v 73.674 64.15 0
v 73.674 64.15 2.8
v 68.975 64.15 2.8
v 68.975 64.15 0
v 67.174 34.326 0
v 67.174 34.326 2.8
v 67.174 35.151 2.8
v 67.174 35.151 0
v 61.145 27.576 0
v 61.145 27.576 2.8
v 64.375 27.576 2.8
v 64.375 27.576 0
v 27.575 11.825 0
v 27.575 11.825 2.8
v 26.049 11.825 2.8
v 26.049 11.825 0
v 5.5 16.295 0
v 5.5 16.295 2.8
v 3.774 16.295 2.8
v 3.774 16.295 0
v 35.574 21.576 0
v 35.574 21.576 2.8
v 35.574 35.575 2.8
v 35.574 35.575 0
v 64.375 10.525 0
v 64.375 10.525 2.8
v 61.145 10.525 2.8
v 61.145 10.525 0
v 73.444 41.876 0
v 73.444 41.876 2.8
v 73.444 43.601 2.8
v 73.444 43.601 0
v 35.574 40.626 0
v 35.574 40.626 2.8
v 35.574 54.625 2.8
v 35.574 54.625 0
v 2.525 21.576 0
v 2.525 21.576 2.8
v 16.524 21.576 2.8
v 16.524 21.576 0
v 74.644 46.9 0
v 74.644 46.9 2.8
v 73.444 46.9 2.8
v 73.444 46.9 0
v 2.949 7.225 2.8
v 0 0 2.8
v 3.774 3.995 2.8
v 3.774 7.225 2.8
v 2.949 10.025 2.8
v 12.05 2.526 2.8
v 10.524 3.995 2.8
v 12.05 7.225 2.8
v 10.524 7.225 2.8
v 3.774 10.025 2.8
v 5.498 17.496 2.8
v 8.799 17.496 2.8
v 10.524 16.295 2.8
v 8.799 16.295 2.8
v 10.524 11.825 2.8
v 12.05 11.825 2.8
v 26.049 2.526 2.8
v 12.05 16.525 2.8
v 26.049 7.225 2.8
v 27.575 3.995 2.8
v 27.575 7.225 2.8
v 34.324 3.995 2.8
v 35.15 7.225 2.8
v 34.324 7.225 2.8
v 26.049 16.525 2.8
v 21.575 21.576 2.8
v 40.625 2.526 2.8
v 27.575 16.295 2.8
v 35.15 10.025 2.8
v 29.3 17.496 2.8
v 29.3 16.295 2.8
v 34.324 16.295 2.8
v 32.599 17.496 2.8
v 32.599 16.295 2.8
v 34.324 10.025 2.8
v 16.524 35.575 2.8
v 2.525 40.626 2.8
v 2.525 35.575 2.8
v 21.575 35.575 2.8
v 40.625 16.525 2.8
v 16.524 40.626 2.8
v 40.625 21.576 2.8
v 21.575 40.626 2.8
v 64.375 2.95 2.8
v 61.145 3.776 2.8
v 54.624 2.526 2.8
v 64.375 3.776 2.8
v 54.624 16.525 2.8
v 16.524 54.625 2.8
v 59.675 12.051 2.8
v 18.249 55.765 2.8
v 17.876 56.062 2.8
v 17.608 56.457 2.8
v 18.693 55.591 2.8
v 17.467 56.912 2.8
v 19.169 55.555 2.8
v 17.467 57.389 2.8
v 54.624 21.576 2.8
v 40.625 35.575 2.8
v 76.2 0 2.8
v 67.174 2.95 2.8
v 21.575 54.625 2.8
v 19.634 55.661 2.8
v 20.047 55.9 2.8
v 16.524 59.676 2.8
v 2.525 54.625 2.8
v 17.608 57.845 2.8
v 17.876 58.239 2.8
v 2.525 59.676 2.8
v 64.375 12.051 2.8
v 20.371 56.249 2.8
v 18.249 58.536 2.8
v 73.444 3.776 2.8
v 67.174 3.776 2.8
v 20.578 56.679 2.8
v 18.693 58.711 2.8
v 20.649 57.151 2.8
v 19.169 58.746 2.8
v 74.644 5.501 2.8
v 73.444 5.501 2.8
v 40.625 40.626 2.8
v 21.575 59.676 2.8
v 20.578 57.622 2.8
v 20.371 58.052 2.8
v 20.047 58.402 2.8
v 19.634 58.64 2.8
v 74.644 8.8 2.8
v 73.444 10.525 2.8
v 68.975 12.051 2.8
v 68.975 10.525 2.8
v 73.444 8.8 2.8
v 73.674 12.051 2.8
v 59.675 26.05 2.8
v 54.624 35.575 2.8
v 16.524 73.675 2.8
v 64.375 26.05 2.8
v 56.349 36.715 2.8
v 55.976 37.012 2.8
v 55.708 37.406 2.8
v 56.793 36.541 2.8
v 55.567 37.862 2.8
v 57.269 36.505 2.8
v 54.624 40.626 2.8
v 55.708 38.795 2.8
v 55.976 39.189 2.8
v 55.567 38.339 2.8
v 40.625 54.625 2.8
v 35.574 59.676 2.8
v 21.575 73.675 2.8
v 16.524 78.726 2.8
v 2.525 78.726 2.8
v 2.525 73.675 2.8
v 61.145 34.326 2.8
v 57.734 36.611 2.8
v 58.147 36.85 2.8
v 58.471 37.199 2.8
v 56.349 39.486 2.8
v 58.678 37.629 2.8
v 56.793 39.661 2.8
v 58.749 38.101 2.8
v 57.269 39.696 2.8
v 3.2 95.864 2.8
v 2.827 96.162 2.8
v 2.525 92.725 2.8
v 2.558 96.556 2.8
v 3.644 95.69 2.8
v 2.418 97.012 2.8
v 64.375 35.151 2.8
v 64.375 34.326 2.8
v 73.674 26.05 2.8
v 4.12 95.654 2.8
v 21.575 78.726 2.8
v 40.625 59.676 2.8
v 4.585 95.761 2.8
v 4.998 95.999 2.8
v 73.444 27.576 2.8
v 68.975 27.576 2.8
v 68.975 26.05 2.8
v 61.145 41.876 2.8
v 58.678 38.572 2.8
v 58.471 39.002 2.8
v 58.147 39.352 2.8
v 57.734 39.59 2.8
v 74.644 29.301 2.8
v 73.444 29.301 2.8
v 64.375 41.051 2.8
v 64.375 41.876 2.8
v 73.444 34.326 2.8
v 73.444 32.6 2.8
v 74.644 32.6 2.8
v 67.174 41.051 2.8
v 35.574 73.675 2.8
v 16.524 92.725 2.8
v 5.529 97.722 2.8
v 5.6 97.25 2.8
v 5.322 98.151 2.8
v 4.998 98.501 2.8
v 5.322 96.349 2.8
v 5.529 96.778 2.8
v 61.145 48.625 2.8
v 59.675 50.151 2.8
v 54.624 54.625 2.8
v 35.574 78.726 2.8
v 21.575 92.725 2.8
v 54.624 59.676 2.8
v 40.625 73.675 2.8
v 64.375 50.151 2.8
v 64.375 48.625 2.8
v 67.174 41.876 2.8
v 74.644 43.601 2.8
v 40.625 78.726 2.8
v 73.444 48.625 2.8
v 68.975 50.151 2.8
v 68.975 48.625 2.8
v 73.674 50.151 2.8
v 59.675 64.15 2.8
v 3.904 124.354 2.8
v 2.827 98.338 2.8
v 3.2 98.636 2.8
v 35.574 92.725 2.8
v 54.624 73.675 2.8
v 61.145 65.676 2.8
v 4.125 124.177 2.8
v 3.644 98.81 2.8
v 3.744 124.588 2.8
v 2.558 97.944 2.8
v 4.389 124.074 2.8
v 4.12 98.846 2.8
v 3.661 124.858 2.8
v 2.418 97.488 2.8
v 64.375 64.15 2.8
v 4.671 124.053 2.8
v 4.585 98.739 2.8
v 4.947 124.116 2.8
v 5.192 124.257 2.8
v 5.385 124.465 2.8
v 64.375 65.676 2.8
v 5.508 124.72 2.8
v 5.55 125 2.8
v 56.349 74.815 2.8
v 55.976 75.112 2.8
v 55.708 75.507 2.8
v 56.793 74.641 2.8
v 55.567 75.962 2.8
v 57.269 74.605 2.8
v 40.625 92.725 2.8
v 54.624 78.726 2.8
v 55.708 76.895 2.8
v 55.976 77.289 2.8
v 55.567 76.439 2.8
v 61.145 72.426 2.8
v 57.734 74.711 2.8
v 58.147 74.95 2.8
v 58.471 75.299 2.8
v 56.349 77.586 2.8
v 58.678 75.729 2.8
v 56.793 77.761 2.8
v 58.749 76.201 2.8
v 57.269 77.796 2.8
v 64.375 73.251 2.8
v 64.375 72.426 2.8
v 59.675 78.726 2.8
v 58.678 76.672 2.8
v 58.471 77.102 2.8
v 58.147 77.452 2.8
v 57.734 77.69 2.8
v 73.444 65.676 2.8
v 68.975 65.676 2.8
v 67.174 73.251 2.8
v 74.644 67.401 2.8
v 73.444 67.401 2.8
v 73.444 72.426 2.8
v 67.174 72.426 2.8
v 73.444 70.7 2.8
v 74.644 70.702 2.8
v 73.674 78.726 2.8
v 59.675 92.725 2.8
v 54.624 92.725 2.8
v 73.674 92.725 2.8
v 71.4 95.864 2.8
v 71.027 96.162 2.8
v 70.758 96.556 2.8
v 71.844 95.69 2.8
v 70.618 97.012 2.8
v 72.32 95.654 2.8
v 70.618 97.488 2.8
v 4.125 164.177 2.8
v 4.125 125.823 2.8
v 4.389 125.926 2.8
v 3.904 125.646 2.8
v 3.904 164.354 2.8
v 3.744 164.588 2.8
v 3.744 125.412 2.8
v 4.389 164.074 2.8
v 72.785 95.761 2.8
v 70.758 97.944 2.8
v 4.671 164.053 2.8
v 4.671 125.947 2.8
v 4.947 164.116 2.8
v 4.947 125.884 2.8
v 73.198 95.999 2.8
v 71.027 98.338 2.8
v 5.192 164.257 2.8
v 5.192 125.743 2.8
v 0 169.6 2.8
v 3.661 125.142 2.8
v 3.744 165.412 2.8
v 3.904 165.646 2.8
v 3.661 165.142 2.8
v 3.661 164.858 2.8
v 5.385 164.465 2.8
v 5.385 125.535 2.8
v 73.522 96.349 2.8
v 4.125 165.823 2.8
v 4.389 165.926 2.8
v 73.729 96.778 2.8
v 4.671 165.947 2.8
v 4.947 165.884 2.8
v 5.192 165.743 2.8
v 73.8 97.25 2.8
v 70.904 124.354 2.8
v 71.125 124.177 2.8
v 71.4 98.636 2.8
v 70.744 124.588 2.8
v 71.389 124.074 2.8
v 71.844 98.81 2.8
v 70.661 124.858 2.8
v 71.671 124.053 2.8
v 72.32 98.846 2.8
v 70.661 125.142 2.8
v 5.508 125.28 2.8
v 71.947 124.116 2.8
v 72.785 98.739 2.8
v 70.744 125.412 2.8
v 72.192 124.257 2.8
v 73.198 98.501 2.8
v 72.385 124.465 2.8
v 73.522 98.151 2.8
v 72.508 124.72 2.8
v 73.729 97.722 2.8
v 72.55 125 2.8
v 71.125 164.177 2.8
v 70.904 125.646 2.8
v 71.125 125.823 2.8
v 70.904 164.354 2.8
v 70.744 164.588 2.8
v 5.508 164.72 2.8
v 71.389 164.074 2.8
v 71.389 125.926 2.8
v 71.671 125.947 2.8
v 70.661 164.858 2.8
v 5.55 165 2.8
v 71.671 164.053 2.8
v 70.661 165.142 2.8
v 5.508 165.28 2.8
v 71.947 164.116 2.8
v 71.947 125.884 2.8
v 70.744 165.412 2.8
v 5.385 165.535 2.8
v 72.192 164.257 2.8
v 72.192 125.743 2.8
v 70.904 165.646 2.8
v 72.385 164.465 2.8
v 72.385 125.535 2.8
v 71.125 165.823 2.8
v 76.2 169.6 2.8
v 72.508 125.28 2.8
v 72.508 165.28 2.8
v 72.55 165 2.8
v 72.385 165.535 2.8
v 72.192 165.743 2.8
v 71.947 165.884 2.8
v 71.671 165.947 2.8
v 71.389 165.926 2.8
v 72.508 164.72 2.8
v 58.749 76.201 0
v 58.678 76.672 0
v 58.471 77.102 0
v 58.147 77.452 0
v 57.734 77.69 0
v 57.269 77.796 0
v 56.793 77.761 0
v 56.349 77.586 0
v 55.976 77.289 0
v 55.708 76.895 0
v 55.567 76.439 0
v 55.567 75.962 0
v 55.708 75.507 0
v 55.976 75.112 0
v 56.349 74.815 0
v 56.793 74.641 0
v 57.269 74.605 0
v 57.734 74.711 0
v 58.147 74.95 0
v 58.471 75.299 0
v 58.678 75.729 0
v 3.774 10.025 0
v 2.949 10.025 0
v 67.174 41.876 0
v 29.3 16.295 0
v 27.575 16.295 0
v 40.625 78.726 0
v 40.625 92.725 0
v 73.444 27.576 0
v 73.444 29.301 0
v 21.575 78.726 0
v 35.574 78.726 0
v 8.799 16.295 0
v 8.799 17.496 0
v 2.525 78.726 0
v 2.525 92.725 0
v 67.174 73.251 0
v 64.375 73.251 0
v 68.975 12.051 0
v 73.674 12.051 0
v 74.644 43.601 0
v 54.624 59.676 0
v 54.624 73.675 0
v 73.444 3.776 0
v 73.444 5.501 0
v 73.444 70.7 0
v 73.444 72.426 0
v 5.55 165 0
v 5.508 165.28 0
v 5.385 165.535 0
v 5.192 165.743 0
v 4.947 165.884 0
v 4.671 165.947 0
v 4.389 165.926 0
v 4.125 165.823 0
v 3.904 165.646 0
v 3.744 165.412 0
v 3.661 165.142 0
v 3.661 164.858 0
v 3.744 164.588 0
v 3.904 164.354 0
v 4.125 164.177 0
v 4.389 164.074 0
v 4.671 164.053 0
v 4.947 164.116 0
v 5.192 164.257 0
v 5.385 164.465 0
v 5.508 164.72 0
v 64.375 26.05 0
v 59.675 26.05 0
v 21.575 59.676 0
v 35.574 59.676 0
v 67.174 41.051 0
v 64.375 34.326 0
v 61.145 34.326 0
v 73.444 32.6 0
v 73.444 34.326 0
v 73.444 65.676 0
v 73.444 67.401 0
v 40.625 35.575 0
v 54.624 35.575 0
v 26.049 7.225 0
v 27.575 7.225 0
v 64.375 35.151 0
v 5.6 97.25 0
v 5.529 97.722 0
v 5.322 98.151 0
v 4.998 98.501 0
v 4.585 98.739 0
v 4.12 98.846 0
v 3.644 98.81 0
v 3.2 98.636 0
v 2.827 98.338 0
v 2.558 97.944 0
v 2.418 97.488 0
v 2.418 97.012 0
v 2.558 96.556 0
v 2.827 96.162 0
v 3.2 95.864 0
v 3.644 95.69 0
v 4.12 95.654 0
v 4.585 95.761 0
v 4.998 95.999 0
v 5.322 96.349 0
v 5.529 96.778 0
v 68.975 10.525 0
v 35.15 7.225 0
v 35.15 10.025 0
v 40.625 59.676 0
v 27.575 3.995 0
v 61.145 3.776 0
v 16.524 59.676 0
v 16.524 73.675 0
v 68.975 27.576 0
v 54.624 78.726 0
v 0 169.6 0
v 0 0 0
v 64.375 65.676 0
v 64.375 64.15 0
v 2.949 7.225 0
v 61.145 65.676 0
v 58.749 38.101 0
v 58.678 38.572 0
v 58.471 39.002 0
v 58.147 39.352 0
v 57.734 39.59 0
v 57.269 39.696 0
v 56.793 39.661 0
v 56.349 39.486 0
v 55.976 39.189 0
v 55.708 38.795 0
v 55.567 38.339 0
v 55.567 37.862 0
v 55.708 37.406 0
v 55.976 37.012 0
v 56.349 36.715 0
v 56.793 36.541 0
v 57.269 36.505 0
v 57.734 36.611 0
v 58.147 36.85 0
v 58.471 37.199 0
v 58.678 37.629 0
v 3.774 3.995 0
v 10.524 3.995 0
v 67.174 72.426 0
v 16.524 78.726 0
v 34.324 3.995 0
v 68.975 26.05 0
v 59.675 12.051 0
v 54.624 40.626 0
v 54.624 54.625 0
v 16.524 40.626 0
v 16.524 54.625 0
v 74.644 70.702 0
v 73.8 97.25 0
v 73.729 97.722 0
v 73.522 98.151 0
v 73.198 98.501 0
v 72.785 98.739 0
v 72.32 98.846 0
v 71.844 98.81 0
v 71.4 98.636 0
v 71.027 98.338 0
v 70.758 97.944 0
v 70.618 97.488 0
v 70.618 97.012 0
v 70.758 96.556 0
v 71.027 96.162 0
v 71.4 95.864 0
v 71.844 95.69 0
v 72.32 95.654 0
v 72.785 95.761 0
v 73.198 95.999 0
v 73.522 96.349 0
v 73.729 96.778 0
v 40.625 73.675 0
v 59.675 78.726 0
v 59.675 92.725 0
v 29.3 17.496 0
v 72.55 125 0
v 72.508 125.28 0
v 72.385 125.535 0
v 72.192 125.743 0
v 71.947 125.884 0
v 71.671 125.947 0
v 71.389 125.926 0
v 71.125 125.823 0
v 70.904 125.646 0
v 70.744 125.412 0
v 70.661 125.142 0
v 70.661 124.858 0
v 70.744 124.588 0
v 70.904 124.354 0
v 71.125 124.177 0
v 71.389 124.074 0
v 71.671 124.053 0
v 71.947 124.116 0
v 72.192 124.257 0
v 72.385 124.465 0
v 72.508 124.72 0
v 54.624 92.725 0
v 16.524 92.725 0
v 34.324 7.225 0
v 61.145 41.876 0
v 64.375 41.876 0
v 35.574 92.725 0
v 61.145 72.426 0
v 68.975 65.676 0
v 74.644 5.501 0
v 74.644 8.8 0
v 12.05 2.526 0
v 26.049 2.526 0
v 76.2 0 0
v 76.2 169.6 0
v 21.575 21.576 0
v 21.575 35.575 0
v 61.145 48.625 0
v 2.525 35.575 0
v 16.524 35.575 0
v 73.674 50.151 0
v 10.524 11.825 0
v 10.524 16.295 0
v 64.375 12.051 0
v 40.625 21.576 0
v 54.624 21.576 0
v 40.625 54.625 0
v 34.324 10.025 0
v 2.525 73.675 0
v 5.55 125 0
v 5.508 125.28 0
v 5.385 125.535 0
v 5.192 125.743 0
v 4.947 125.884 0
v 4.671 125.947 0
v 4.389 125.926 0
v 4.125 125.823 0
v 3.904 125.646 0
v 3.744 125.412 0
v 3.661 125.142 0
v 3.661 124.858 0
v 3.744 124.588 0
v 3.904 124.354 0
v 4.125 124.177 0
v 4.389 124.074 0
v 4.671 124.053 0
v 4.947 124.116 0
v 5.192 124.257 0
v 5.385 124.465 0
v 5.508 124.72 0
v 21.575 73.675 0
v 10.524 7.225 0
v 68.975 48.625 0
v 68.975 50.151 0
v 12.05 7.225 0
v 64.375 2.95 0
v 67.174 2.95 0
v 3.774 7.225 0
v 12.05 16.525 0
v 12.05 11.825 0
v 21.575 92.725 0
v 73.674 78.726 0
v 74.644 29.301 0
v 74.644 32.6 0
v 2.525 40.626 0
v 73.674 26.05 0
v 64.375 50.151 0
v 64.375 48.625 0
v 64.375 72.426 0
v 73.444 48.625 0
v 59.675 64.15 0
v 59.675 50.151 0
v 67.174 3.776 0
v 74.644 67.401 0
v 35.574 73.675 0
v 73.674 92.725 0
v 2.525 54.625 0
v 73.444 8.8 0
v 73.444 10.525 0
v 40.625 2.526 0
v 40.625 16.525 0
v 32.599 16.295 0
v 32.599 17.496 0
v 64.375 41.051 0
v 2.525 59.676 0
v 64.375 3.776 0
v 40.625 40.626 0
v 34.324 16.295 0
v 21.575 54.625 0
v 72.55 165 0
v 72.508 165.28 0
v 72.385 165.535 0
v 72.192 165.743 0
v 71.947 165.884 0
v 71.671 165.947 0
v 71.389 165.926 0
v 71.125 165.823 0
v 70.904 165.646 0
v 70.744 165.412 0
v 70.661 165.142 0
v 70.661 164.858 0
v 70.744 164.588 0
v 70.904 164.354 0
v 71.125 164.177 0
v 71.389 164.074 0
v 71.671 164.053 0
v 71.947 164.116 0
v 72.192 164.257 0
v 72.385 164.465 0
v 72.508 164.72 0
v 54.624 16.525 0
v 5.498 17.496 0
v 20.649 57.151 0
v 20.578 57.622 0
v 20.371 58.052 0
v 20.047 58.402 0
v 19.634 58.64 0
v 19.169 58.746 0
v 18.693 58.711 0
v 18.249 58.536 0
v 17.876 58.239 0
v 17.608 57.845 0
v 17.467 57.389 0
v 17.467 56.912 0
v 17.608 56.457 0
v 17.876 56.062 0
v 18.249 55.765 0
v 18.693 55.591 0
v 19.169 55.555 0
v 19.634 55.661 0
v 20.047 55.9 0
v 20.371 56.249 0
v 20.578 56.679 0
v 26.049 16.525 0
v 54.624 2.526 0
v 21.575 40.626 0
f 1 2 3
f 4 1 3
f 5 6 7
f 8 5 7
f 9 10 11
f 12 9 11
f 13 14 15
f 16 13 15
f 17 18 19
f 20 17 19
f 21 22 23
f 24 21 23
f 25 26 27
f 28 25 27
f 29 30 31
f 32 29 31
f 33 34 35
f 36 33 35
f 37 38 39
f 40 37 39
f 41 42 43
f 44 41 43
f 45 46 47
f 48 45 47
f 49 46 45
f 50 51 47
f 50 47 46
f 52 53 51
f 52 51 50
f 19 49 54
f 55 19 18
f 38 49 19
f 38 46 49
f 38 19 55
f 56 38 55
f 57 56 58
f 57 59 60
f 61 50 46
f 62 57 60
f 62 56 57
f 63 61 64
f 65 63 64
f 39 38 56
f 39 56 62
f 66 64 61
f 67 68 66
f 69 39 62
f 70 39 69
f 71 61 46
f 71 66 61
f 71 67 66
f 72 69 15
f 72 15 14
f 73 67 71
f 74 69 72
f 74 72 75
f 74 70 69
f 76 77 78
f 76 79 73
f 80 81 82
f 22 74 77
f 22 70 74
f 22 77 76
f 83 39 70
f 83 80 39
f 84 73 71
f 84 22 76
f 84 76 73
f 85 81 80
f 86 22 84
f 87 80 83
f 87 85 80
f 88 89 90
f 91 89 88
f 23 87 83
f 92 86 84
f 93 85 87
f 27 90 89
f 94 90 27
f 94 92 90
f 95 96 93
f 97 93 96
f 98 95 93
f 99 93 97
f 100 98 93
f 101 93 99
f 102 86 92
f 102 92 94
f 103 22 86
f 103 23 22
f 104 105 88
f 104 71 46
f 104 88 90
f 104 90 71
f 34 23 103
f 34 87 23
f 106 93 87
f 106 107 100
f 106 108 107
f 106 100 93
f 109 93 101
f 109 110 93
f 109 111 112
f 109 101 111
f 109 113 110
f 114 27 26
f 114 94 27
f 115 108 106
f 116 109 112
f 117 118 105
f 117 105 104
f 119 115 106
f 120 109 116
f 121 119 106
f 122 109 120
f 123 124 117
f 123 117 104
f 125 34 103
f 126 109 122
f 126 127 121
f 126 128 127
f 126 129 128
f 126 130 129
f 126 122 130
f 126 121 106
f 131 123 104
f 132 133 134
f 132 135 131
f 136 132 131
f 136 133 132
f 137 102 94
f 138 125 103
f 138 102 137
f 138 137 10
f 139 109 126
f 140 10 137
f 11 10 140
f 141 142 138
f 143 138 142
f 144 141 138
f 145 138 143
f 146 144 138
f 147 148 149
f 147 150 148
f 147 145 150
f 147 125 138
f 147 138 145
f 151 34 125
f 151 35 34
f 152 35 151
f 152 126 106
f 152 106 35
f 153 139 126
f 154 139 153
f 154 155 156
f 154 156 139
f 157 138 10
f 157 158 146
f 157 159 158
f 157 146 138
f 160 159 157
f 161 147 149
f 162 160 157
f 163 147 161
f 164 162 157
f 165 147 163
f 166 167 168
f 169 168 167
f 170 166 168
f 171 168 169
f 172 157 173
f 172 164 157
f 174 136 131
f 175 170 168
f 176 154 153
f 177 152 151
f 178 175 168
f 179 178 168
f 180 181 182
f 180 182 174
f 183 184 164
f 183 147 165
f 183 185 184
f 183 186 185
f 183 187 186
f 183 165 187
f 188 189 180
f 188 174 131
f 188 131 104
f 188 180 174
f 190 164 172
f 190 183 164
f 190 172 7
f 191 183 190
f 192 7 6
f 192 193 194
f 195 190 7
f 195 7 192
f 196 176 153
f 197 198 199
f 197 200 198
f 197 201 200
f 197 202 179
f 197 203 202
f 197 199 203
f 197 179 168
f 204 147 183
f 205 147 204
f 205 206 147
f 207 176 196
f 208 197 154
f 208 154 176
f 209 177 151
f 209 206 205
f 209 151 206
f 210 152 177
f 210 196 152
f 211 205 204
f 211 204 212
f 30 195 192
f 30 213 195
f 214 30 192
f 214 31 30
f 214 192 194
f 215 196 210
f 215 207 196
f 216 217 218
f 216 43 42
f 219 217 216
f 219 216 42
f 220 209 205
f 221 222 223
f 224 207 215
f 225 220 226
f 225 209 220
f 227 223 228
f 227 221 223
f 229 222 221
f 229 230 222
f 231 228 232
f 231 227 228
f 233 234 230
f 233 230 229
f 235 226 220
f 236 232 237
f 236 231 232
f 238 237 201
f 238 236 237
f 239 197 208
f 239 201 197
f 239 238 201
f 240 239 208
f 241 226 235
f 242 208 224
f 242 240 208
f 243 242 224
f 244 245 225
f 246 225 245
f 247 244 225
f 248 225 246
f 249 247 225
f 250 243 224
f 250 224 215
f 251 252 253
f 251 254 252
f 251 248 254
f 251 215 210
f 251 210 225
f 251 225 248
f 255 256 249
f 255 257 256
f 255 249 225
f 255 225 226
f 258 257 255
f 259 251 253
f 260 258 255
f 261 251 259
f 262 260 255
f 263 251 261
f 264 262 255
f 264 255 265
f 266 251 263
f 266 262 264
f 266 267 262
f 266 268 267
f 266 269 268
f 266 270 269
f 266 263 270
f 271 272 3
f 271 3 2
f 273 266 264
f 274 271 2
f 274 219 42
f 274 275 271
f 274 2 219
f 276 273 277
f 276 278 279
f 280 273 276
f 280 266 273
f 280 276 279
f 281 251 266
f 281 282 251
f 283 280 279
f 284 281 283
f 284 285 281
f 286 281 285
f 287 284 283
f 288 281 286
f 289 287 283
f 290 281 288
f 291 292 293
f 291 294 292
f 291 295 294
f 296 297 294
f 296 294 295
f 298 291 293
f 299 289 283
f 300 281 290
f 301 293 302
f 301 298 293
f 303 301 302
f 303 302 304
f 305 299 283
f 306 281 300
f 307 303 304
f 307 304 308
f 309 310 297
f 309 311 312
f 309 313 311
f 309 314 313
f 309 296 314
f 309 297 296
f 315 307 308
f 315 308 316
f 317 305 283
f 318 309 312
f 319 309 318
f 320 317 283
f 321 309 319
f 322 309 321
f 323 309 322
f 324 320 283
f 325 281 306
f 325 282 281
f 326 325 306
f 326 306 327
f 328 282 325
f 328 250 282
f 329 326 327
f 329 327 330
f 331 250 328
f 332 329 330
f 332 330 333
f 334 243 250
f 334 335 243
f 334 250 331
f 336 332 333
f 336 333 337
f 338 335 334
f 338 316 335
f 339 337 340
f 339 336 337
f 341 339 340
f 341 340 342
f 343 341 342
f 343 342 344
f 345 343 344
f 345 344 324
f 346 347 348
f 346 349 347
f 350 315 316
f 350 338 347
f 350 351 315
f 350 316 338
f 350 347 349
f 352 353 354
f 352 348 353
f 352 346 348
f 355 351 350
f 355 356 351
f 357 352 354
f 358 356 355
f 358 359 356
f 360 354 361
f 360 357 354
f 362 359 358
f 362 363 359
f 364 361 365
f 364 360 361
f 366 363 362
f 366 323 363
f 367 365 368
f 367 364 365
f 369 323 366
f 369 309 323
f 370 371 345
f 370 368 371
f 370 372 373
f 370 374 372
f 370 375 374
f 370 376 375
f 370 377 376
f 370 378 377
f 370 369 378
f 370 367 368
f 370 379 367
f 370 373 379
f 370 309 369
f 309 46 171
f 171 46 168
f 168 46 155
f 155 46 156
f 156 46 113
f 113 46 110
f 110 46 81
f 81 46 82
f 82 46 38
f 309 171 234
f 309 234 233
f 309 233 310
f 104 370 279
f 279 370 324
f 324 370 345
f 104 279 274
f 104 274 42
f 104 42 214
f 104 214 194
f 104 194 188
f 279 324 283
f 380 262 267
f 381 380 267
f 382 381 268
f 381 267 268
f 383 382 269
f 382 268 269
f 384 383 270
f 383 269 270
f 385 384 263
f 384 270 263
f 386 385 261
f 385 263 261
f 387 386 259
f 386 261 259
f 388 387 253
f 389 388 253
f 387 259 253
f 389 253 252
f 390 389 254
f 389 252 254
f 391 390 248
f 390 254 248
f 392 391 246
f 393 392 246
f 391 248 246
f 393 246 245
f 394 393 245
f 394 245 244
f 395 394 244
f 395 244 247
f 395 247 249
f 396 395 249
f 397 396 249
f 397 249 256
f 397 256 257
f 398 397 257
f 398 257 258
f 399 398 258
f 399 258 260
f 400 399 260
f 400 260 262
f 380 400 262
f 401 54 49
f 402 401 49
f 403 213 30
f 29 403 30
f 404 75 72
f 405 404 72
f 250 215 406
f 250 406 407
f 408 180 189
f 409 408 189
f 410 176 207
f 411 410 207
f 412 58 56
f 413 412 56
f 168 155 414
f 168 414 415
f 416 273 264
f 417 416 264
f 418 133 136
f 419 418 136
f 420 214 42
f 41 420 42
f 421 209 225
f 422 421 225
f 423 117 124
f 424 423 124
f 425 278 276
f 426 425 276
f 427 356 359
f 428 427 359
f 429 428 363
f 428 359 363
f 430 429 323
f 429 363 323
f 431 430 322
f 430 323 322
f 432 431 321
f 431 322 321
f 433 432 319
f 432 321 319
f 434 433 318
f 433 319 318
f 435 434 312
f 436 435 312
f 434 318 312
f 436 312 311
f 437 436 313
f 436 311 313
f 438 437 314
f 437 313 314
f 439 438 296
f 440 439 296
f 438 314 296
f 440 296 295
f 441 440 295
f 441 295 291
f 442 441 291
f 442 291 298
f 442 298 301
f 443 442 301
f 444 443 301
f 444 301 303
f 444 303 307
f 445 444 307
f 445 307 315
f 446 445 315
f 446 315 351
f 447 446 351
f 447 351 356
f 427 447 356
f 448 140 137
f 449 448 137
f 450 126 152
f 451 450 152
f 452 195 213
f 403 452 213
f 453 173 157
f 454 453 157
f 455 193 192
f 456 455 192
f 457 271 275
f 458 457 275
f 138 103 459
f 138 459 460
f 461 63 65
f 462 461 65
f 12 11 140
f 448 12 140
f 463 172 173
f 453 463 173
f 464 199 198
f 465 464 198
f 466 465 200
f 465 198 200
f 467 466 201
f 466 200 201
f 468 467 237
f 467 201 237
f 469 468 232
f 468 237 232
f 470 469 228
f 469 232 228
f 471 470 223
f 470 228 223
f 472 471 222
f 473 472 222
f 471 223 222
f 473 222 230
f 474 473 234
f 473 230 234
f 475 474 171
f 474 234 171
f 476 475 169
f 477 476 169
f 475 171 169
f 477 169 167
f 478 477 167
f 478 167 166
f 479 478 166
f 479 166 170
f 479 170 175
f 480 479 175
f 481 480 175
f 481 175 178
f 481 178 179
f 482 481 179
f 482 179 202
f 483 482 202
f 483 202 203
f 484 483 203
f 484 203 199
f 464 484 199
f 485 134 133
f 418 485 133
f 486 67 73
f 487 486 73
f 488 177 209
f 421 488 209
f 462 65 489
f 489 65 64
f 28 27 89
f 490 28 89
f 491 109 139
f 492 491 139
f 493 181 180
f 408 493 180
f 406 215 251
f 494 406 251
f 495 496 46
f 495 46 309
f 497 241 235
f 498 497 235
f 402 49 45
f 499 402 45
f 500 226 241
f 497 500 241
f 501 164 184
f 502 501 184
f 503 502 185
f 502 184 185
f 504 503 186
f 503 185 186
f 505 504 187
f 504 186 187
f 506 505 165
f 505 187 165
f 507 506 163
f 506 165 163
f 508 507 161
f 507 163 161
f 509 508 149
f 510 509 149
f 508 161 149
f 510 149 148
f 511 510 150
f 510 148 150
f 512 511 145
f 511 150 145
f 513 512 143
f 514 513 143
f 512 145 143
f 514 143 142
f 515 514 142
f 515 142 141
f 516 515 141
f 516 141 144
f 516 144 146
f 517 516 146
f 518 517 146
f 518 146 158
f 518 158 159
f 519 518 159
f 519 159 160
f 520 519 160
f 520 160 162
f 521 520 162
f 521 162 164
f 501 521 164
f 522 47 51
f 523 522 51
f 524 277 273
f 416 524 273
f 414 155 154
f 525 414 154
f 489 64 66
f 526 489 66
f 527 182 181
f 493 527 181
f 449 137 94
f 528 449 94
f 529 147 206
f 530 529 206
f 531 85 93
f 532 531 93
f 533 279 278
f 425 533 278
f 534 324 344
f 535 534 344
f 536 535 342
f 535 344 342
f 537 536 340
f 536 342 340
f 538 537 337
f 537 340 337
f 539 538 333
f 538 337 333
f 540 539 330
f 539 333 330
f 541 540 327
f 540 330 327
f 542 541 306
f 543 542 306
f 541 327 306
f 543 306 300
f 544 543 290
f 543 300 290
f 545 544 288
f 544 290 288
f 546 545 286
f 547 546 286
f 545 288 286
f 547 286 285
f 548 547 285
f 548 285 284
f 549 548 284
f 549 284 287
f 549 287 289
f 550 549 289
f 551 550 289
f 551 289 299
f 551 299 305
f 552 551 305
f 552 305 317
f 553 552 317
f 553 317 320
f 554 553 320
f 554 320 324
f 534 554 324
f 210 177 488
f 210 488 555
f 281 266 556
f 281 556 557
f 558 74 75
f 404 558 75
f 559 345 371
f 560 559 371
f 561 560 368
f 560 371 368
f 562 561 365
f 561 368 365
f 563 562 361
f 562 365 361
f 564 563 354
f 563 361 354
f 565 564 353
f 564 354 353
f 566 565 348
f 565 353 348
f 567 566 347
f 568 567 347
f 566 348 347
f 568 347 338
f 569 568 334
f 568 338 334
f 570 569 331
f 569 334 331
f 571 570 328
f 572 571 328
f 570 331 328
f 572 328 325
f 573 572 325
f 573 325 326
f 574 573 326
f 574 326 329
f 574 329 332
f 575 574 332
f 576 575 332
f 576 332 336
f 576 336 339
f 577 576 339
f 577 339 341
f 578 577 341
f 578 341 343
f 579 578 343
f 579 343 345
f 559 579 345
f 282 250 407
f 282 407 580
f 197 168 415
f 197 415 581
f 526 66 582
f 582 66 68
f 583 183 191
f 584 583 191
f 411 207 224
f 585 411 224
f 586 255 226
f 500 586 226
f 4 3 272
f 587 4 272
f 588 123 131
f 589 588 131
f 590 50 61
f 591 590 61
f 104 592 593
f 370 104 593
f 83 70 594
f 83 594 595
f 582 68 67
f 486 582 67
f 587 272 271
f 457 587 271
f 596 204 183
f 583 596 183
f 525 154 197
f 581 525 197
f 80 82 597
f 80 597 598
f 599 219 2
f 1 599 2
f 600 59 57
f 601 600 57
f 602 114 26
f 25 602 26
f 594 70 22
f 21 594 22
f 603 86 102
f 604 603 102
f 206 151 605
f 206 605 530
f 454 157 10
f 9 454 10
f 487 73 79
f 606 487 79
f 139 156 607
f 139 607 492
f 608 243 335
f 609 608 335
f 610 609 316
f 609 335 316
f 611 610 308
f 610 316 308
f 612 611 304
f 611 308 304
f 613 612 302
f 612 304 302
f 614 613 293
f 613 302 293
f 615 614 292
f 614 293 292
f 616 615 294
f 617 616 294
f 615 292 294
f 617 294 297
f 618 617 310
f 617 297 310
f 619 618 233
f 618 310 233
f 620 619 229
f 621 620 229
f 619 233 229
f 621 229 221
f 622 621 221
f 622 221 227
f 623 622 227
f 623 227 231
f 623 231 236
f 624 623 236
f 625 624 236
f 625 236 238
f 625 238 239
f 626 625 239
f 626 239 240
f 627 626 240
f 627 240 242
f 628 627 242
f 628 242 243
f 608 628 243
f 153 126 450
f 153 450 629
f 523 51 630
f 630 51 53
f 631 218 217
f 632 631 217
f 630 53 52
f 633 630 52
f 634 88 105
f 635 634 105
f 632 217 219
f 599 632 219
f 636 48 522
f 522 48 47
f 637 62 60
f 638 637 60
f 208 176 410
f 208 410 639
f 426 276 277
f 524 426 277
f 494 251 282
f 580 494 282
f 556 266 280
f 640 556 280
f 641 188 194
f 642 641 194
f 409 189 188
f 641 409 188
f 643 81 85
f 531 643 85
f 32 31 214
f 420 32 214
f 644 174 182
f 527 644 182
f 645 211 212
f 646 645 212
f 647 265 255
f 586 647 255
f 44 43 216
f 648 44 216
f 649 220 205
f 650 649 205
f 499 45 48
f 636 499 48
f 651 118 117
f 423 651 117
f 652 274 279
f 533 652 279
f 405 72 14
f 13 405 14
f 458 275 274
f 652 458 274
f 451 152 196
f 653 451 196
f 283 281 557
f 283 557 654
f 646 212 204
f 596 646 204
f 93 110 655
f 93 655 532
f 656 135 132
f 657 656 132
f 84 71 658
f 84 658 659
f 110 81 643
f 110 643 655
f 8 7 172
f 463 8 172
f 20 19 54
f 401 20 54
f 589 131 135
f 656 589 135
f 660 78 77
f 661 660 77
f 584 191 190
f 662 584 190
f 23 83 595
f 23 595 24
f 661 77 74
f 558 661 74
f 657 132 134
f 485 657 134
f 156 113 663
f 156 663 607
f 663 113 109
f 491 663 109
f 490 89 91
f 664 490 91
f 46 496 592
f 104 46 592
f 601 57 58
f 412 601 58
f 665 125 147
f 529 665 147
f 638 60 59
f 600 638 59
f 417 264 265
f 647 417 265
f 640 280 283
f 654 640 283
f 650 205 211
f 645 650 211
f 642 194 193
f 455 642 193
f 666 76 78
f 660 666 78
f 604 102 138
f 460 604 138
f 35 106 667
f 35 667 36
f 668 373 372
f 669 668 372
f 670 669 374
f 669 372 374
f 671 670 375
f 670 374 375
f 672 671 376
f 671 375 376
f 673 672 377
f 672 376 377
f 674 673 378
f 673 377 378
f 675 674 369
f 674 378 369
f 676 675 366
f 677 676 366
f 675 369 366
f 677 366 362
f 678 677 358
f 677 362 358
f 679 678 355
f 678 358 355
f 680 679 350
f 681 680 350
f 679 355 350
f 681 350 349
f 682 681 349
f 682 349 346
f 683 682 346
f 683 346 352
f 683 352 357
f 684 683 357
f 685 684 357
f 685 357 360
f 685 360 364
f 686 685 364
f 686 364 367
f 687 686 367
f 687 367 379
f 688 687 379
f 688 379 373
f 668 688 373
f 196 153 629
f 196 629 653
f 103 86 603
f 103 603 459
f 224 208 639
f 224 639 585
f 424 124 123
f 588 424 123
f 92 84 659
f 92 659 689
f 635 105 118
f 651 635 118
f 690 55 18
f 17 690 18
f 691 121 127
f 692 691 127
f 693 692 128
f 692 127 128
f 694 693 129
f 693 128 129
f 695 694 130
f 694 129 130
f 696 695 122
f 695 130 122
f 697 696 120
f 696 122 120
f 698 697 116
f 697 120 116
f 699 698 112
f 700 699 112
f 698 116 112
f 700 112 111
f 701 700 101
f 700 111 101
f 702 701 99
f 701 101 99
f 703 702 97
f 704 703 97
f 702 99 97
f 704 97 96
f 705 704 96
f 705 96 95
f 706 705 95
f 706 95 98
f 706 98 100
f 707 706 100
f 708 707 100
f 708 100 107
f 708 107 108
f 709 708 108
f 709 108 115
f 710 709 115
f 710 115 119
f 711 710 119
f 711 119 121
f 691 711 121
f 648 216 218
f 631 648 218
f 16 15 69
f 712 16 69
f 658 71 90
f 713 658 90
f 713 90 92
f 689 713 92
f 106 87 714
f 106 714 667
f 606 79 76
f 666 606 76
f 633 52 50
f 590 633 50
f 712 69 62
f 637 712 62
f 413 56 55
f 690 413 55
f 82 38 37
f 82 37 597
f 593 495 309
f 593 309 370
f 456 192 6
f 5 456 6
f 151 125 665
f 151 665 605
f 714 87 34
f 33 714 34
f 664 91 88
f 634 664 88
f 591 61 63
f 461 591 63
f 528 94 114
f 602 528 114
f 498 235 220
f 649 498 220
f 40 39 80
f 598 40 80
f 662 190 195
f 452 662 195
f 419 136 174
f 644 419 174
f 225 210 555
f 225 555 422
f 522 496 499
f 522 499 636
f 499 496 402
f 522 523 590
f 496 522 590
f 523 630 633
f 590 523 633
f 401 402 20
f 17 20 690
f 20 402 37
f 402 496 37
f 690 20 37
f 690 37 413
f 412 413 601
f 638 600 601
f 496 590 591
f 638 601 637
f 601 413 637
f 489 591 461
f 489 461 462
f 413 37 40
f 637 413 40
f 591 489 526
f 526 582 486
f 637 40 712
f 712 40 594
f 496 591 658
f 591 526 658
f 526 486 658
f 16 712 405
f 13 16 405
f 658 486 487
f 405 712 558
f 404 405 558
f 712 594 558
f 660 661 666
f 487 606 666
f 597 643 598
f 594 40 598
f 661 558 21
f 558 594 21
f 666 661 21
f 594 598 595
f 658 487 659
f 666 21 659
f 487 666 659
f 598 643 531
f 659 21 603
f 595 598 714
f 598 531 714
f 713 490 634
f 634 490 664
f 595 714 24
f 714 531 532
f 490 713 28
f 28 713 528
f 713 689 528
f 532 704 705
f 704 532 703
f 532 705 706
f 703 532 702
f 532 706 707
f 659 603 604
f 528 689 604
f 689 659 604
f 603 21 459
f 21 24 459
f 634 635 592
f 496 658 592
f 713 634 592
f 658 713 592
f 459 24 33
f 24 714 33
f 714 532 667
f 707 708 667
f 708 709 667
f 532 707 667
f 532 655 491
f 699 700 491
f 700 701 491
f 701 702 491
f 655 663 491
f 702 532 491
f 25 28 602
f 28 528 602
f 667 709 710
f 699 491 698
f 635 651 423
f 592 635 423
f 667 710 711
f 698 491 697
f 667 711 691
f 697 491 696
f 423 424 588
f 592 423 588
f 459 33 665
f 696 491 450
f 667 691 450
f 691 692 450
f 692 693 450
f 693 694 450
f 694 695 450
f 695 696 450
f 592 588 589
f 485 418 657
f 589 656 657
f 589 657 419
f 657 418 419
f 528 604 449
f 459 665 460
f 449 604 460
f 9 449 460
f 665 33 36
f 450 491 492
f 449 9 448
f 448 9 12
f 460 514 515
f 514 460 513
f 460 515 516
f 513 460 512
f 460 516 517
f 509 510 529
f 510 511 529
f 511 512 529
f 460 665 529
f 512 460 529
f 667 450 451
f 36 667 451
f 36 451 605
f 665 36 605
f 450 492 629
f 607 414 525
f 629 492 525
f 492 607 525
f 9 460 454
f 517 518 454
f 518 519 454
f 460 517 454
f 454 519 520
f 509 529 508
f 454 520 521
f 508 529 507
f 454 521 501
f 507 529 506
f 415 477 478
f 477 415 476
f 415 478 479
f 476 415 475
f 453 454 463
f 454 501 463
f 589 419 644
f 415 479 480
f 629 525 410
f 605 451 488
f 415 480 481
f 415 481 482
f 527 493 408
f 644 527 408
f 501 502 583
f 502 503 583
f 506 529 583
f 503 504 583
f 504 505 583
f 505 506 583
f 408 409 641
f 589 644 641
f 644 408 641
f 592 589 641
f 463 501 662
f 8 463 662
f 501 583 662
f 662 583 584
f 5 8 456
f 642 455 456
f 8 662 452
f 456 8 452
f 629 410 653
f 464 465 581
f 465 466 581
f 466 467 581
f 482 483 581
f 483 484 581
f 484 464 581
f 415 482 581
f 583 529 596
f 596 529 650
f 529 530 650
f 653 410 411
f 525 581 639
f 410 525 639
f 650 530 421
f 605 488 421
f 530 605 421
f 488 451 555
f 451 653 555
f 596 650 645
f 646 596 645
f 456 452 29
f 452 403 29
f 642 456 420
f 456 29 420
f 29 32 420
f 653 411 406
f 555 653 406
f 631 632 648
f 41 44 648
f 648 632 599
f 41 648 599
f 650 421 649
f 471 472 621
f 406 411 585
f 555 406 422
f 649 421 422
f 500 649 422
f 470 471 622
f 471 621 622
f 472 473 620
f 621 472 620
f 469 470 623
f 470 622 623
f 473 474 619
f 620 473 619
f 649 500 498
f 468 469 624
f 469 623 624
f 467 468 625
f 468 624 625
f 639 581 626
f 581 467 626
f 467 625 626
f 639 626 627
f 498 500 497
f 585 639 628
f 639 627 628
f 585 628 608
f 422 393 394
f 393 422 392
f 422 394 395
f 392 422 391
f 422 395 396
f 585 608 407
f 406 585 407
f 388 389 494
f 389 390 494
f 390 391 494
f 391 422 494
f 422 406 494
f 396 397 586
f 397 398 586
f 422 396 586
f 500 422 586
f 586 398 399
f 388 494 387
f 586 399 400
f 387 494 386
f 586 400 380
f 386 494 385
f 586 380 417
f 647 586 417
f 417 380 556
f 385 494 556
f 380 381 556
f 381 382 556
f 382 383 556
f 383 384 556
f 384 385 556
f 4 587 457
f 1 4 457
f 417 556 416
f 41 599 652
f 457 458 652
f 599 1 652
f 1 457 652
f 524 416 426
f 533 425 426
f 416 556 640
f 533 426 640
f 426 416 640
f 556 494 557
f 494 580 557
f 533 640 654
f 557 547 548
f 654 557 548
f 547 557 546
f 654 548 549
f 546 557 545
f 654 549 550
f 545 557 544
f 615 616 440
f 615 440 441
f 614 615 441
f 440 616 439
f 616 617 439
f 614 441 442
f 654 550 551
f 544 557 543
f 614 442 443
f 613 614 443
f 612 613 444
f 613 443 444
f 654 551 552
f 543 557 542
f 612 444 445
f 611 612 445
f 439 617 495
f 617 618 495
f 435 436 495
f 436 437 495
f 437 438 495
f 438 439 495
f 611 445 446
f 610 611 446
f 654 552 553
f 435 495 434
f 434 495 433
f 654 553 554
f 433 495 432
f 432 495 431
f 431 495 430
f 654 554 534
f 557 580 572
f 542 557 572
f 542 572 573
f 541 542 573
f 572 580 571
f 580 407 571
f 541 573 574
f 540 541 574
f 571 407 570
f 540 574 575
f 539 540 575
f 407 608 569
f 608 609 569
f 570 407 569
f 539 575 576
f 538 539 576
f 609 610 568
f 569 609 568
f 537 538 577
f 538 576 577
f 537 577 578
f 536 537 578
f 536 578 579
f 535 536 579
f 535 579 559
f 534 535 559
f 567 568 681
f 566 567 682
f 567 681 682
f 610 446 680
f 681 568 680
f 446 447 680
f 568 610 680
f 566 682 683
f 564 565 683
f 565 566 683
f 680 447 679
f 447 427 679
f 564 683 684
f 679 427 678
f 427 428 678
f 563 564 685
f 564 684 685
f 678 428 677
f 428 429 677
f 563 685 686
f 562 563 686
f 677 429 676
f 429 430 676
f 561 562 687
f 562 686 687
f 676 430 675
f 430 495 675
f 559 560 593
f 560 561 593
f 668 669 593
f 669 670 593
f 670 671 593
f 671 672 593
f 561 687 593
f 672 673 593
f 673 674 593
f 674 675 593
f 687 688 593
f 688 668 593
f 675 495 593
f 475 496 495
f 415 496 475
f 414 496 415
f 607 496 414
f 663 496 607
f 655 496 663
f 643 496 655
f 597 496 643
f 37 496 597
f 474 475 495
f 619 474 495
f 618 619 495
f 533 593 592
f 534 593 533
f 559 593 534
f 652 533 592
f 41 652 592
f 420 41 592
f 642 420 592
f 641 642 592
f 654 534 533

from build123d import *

# Parameters (mm, degrees)
SKETCH_W        = 76.2
SKETCH_H        = 169.6
PAD_DEPTH       = 2.8
SKETCH001_W     = 13.9993
SKETCH001_H     = 13.9993
SKETCH001_H_2   = 13.99946
SKETCH001_W_2   = 13.99955
SKETCH001_H_3   = 13.9994
POCKET_DEPTH    = 5
SKETCH002_R     = 1.6
POCKET001_DEPTH = 2.801
SKETCH011_R     = 0.95
POCKET002_DEPTH = 2.801


with BuildPart() as part:
    # Sketch → Pad (new body)
    with BuildSketch(Plane.XY):
        with Locations((38.1, 84.8)):
            Rectangle(SKETCH_W, SKETCH_H)
    extrude(amount=PAD_DEPTH)

    # Sketch001 (on Face6 of Pad) → Pocket (cut)
    with BuildSketch(Plane.XY.offset(2.8)):
        with Locations((66.674265, 85.725757)):
            Rectangle(SKETCH001_W, SKETCH001_H)
        with Locations((47.624265, 85.725757)):
            Rectangle(SKETCH001_W, SKETCH001_H)
        Polygon((5.498385, 17.495607), (5.499755, 16.295307), (3.774465, 16.295307), (3.774465, 10.025207), (2.949005, 10.025207), (2.949005, 7.225037), (3.774465, 7.225037), (3.774465, 3.994937), (10.524115, 3.994937), (10.524115, 7.225037), (12.049615, 7.225037), (12.049615, 2.525947), (26.049015, 2.525947), (26.049015, 7.225037), (27.574515, 7.225037), (27.574515, 3.994937), (34.324215, 3.994937), (34.324215, 7.225037), (35.149615, 7.225037), (35.149615, 10.025207), (34.324215, 10.025207), (34.324215, 16.295307), (32.598915, 16.295307), (32.598915, 17.495607), (29.299815, 17.495607), (29.299815, 16.295307), (27.574515, 16.295307), (27.574515, 11.824907), (26.049015, 11.824907), (26.049015, 16.525407), (12.049615, 16.525407), (12.049615, 11.824907), (10.524115, 11.824907), (10.524115, 16.295307), (8.798765, 16.295307), (8.798765, 17.495607), align=None)
        with Locations((47.624265, 9.525677)):
            Rectangle(SKETCH001_W, SKETCH001_H_2)
        Polygon((64.375015, 35.151007), (64.375015, 34.325607), (61.145015, 34.325607), (61.145015, 27.575907), (64.375015, 27.575907), (64.375015, 26.050407), (59.674615, 26.050407), (59.674615, 12.050907), (64.375015, 12.050907), (64.375015, 10.525407), (61.145015, 10.525407), (61.145015, 3.775827), (64.375015, 3.775827), (64.375015, 2.950377), (67.174015, 2.950377), (67.174015, 3.775827), (73.443915, 3.775827), (73.443915, 5.501117), (74.644015, 5.501117), (74.644015, 8.800157), (73.443915, 8.800157), (73.443915, 10.525407), (68.974915, 10.525407), (68.974915, 12.050907), (73.673915, 12.050907), (73.673915, 26.050407), (68.974915, 26.050407), (68.974915, 27.575907), (73.443915, 27.575907), (73.443915, 29.301207), (74.644015, 29.301207), (74.644015, 32.600207), (73.443915, 32.600207), (73.443915, 34.325607), (67.174015, 34.325607), (67.174015, 35.151007), align=None)
        with Locations((9.52434, 28.575607)):
            Rectangle(SKETCH001_W_2, SKETCH001_H_3)
        with Locations((28.574265, 28.575607)):
            Rectangle(SKETCH001_W, SKETCH001_H_3)
        with Locations((47.624265, 28.575607)):
            Rectangle(SKETCH001_W, SKETCH001_H_3)
        with Locations((9.52434, 47.625757)):
            Rectangle(SKETCH001_W_2, SKETCH001_H)
        with Locations((28.574265, 47.625757)):
            Rectangle(SKETCH001_W, SKETCH001_H)
        with Locations((47.624265, 47.625757)):
            Rectangle(SKETCH001_W, SKETCH001_H)
        Polygon((64.375015, 73.251007), (64.375015, 72.425507), (61.145015, 72.425507), (61.145015, 65.675807), (64.375015, 65.675807), (64.375015, 64.150407), (59.674615, 64.150407), (59.674615, 50.151107), (64.375015, 50.151107), (64.375015, 48.625307), (61.145015, 48.625307), (61.145015, 41.876007), (64.375015, 41.876007), (64.375015, 41.050507), (67.174015, 41.050507), (67.174015, 41.876007), (73.443915, 41.876007), (73.443915, 43.601007), (74.644015, 43.601007), (74.644015, 46.900207), (73.443915, 46.900207), (73.443915, 48.625307), (68.974915, 48.625307), (68.974915, 50.151107), (73.673915, 50.151107), (73.673915, 64.150407), (68.974915, 64.150407), (68.974915, 65.675807), (73.443915, 65.675807), (73.443915, 67.401207), (74.644015, 67.401207), (74.644015, 70.701807), (73.443915, 70.700407), (73.443915, 72.425507), (67.174015, 72.425507), (67.174015, 73.251007), align=None)
        with Locations((9.52434, 66.675757)):
            Rectangle(SKETCH001_W_2, SKETCH001_H)
        with Locations((28.574265, 66.675757)):
            Rectangle(SKETCH001_W, SKETCH001_H)
        with Locations((47.624265, 66.675757)):
            Rectangle(SKETCH001_W, SKETCH001_H)
        with Locations((9.52434, 85.725757)):
            Rectangle(SKETCH001_W_2, SKETCH001_H)
        with Locations((28.574265, 85.725757)):
            Rectangle(SKETCH001_W, SKETCH001_H)
    extrude(amount=-POCKET_DEPTH, mode=Mode.SUBTRACT)

    # Sketch002 (on Face5 of Pocket) → Pocket001 (cut, through all)
    with BuildSketch(Plane.XY.offset(2.8)):
        with Locations((19.049365, 57.150757)):
            Circle(SKETCH002_R)
        with Locations((57.149265, 76.200757)):
            Circle(SKETCH002_R)
        with Locations((57.149265, 38.100707)):
            Circle(SKETCH002_R)
        with Locations((4, 97.25)):
            Circle(SKETCH002_R)
        with Locations((72.2, 97.25)):
            Circle(SKETCH002_R)
    extrude(amount=-POCKET001_DEPTH, mode=Mode.SUBTRACT)

    # Sketch011 (on Face5 of Pocket001) → Pocket002 (cut, through all)
    with BuildSketch(Plane.XY.offset(2.8)):
        with Locations((4.6, 125)):
            Circle(SKETCH011_R)
        with Locations((71.6, 125)):
            Circle(SKETCH011_R)
        with Locations((4.6, 165)):
            Circle(SKETCH011_R)
        with Locations((71.6, 165)):
            Circle(SKETCH011_R)
    extrude(amount=-POCKET002_DEPTH, mode=Mode.SUBTRACT)


solid = part.part
